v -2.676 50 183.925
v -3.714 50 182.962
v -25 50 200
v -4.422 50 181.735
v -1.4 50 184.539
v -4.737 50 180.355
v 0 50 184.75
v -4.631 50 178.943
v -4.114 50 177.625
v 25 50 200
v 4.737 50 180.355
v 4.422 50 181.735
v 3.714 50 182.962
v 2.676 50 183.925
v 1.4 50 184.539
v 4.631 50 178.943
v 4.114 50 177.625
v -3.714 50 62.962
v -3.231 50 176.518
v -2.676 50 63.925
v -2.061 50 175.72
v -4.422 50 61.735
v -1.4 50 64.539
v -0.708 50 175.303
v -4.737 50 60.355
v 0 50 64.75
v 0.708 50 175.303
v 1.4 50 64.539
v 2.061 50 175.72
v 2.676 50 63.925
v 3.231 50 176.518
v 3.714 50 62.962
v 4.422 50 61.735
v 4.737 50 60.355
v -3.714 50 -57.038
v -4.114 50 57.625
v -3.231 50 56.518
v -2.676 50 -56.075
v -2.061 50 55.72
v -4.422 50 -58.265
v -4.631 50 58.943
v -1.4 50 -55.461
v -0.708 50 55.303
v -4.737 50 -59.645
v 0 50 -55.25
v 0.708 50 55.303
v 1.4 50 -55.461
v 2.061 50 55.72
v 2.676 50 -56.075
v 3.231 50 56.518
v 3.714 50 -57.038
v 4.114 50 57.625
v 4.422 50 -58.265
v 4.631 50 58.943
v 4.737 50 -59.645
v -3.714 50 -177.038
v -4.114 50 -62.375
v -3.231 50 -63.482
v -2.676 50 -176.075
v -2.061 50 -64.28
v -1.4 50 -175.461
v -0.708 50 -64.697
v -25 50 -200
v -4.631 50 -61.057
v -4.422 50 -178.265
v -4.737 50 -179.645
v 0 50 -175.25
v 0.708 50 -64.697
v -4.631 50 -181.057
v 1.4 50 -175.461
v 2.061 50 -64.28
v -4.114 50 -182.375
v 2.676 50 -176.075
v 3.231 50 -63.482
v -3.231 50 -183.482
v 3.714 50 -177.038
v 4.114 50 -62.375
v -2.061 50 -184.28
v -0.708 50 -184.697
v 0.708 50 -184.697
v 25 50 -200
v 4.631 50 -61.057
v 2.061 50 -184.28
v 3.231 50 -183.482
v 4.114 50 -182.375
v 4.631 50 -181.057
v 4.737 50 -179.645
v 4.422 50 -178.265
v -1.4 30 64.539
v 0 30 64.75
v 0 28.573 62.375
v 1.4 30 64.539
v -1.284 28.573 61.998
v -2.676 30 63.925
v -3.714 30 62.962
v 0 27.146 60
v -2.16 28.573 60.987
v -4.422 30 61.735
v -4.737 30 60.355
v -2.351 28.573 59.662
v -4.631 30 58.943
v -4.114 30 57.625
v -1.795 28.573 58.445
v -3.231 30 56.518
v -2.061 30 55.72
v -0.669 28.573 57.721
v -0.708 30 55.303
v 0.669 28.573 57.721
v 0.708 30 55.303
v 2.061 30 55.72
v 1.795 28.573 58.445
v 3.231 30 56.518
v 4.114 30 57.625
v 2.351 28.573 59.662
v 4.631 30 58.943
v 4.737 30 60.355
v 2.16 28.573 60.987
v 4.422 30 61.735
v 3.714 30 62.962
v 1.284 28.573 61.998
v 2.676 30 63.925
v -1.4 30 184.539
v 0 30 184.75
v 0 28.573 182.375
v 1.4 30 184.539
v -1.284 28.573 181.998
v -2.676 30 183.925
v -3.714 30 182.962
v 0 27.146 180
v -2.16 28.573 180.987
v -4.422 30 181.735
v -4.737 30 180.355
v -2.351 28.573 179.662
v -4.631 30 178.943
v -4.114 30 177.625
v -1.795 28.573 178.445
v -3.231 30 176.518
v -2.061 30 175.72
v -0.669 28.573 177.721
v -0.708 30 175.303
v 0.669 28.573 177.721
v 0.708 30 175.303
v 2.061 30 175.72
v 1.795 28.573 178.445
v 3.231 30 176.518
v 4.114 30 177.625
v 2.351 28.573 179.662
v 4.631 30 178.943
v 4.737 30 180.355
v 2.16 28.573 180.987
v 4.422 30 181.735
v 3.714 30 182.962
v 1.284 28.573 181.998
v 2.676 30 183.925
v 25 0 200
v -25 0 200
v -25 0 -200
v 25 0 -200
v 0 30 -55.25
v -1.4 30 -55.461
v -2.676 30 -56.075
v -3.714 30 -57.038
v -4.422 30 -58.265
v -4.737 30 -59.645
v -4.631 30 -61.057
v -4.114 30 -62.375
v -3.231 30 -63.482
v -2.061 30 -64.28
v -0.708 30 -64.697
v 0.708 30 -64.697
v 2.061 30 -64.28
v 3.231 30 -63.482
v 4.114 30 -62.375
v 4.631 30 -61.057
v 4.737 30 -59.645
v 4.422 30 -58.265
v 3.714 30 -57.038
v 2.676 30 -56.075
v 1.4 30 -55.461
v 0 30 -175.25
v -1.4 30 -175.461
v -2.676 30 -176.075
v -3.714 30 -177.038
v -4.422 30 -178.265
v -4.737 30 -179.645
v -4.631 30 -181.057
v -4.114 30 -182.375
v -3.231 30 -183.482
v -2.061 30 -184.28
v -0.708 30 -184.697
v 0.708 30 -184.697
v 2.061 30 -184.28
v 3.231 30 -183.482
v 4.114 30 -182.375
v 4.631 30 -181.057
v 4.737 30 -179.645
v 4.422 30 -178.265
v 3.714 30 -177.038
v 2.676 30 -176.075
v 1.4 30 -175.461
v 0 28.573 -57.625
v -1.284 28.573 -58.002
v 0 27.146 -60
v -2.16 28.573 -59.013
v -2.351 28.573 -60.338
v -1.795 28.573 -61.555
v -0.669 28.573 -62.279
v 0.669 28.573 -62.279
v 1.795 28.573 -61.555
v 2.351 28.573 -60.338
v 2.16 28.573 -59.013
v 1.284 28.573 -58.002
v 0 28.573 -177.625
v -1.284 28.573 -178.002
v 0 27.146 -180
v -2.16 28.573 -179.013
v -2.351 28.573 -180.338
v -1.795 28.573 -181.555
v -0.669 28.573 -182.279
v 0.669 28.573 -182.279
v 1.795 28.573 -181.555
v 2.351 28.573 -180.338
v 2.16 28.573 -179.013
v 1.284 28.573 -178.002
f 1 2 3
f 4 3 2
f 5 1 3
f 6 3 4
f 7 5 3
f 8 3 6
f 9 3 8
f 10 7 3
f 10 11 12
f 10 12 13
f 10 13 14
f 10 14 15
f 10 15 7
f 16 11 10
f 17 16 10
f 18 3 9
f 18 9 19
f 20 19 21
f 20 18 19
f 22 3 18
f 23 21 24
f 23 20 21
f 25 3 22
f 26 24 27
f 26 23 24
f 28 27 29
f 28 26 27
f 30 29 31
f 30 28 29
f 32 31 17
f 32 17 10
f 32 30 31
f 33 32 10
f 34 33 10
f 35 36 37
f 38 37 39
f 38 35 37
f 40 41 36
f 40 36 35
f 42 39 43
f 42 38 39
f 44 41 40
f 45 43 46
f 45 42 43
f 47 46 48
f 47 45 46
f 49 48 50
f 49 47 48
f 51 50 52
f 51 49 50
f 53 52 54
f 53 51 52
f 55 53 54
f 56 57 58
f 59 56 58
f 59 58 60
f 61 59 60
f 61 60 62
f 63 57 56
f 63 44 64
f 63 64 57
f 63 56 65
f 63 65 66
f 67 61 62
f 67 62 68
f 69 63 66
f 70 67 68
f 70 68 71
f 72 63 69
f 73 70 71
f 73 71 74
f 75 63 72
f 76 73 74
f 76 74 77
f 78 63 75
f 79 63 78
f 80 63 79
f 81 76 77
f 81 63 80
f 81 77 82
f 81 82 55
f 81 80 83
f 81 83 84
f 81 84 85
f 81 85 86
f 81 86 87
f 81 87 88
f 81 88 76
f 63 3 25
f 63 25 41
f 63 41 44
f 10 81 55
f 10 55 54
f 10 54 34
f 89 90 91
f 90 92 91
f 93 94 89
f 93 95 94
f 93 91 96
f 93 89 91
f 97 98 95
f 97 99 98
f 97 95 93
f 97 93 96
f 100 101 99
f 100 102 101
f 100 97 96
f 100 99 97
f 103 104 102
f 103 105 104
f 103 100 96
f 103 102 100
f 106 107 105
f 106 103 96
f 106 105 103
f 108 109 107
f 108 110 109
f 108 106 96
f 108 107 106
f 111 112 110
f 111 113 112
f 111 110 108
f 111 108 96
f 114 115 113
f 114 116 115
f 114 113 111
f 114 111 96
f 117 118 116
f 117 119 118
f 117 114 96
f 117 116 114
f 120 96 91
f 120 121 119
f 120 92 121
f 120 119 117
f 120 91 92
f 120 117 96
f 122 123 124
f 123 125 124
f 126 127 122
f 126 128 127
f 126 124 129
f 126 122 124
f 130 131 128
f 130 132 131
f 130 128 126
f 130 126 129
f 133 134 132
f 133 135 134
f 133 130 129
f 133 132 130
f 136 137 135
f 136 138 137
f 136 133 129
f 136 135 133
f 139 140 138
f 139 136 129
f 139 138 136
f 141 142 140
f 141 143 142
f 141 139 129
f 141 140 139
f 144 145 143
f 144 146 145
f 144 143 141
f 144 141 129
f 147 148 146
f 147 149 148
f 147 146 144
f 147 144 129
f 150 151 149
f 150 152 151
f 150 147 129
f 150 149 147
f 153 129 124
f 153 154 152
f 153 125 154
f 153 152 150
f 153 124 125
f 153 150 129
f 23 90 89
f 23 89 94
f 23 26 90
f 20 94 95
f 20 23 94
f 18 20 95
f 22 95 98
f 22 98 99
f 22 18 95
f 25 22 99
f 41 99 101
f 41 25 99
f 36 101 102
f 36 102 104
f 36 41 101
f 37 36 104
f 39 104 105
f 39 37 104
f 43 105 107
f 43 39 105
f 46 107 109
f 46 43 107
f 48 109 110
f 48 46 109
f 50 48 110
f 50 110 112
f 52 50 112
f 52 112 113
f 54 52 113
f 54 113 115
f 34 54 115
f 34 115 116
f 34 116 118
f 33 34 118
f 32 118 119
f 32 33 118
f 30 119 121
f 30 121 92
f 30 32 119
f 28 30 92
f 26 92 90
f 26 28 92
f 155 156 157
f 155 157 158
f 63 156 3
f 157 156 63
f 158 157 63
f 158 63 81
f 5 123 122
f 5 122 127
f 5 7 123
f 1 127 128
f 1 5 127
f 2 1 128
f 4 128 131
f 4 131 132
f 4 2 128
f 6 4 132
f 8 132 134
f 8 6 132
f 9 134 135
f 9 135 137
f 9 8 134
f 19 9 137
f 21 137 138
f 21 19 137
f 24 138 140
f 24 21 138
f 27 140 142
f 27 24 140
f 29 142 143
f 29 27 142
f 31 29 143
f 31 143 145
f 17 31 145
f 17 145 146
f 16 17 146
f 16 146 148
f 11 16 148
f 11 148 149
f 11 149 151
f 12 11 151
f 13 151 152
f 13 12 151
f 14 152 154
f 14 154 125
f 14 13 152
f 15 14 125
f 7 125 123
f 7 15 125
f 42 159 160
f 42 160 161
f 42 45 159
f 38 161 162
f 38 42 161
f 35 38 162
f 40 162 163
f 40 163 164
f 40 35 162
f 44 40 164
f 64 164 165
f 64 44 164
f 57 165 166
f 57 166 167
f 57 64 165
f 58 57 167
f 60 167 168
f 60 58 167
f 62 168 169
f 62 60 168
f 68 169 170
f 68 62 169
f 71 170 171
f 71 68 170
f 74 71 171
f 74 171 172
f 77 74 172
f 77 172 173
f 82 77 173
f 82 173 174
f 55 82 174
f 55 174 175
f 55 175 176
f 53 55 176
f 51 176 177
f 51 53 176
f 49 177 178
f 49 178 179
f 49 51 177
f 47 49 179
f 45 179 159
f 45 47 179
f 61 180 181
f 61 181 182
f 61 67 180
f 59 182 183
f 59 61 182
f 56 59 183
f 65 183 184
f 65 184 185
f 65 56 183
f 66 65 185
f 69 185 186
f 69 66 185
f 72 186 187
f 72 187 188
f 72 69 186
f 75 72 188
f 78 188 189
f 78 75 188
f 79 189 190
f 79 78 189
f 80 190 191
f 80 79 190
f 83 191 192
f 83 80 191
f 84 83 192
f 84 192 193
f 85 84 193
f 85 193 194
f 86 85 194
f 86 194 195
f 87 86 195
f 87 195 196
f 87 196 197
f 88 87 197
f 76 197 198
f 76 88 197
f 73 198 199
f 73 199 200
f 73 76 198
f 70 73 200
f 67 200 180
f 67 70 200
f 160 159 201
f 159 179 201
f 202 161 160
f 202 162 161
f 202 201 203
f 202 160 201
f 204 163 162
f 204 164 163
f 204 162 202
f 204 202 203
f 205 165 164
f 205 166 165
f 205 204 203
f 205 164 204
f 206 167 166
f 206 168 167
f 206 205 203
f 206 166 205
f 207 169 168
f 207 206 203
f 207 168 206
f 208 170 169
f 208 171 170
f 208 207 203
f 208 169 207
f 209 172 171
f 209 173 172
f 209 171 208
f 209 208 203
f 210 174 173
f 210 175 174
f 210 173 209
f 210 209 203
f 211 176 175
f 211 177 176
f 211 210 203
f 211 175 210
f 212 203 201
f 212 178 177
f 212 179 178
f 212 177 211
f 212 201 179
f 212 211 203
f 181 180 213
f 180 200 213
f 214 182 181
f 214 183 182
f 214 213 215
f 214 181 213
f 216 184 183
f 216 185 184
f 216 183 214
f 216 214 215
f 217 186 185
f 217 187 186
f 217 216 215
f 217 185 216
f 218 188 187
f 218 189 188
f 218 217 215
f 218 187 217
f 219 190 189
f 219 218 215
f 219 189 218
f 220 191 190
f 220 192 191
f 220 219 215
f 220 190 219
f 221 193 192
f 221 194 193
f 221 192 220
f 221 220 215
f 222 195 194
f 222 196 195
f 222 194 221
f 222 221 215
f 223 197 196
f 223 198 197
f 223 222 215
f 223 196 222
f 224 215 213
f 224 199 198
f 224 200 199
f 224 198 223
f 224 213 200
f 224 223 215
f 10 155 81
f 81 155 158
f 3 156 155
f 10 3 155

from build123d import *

# Parameters (mm, degrees)
SKIZZE1_W                       = 50
SKIZZE1_H                       = 400
AUFSATZ_LINEAR_AUSTRAGEN1_DEPTH = 50
LINEARES_MUSTER1_COUNT          = 4
LINEARES_MUSTER1_PITCH          = 120


with BuildPart() as part:
    # Skizze1 → Aufsatz-Linear austragen1 (new body)
    with BuildSketch(Plane(origin=(0, 0, 0), x_dir=(1, 0, 0), z_dir=(0, 1, 0))):
        Rectangle(SKIZZE1_W, SKIZZE1_H)
    extrude(amount=AUFSATZ_LINEAR_AUSTRAGEN1_DEPTH)

    # Skizze2 → Ø9.5 (9.5) Durchmesser Bohrung1 (revolve, cut)
    with BuildSketch(Plane(origin=(0, 50, 180), x_dir=(0, 0, 1), z_dir=(1, 0, 0))):
        Polygon((0, 0), (0, 22.85408794), (4.75, 20), (4.75, 0), align=None)
    f_9_5_9_5_durchmesser_bohrung1 = revolve(axis=Axis((0, 56.35, 180), (0, -1, 0)), mode=Mode.SUBTRACT)

    # Lineares Muster1: Ø9.5 (9.5) Durchmesser Bohrung1 ×4
    with Locations(*[(0, 0, -i * LINEARES_MUSTER1_PITCH) for i in range(1, LINEARES_MUSTER1_COUNT)]):
        add(f_9_5_9_5_durchmesser_bohrung1, mode=Mode.SUBTRACT)


solid = part.part
